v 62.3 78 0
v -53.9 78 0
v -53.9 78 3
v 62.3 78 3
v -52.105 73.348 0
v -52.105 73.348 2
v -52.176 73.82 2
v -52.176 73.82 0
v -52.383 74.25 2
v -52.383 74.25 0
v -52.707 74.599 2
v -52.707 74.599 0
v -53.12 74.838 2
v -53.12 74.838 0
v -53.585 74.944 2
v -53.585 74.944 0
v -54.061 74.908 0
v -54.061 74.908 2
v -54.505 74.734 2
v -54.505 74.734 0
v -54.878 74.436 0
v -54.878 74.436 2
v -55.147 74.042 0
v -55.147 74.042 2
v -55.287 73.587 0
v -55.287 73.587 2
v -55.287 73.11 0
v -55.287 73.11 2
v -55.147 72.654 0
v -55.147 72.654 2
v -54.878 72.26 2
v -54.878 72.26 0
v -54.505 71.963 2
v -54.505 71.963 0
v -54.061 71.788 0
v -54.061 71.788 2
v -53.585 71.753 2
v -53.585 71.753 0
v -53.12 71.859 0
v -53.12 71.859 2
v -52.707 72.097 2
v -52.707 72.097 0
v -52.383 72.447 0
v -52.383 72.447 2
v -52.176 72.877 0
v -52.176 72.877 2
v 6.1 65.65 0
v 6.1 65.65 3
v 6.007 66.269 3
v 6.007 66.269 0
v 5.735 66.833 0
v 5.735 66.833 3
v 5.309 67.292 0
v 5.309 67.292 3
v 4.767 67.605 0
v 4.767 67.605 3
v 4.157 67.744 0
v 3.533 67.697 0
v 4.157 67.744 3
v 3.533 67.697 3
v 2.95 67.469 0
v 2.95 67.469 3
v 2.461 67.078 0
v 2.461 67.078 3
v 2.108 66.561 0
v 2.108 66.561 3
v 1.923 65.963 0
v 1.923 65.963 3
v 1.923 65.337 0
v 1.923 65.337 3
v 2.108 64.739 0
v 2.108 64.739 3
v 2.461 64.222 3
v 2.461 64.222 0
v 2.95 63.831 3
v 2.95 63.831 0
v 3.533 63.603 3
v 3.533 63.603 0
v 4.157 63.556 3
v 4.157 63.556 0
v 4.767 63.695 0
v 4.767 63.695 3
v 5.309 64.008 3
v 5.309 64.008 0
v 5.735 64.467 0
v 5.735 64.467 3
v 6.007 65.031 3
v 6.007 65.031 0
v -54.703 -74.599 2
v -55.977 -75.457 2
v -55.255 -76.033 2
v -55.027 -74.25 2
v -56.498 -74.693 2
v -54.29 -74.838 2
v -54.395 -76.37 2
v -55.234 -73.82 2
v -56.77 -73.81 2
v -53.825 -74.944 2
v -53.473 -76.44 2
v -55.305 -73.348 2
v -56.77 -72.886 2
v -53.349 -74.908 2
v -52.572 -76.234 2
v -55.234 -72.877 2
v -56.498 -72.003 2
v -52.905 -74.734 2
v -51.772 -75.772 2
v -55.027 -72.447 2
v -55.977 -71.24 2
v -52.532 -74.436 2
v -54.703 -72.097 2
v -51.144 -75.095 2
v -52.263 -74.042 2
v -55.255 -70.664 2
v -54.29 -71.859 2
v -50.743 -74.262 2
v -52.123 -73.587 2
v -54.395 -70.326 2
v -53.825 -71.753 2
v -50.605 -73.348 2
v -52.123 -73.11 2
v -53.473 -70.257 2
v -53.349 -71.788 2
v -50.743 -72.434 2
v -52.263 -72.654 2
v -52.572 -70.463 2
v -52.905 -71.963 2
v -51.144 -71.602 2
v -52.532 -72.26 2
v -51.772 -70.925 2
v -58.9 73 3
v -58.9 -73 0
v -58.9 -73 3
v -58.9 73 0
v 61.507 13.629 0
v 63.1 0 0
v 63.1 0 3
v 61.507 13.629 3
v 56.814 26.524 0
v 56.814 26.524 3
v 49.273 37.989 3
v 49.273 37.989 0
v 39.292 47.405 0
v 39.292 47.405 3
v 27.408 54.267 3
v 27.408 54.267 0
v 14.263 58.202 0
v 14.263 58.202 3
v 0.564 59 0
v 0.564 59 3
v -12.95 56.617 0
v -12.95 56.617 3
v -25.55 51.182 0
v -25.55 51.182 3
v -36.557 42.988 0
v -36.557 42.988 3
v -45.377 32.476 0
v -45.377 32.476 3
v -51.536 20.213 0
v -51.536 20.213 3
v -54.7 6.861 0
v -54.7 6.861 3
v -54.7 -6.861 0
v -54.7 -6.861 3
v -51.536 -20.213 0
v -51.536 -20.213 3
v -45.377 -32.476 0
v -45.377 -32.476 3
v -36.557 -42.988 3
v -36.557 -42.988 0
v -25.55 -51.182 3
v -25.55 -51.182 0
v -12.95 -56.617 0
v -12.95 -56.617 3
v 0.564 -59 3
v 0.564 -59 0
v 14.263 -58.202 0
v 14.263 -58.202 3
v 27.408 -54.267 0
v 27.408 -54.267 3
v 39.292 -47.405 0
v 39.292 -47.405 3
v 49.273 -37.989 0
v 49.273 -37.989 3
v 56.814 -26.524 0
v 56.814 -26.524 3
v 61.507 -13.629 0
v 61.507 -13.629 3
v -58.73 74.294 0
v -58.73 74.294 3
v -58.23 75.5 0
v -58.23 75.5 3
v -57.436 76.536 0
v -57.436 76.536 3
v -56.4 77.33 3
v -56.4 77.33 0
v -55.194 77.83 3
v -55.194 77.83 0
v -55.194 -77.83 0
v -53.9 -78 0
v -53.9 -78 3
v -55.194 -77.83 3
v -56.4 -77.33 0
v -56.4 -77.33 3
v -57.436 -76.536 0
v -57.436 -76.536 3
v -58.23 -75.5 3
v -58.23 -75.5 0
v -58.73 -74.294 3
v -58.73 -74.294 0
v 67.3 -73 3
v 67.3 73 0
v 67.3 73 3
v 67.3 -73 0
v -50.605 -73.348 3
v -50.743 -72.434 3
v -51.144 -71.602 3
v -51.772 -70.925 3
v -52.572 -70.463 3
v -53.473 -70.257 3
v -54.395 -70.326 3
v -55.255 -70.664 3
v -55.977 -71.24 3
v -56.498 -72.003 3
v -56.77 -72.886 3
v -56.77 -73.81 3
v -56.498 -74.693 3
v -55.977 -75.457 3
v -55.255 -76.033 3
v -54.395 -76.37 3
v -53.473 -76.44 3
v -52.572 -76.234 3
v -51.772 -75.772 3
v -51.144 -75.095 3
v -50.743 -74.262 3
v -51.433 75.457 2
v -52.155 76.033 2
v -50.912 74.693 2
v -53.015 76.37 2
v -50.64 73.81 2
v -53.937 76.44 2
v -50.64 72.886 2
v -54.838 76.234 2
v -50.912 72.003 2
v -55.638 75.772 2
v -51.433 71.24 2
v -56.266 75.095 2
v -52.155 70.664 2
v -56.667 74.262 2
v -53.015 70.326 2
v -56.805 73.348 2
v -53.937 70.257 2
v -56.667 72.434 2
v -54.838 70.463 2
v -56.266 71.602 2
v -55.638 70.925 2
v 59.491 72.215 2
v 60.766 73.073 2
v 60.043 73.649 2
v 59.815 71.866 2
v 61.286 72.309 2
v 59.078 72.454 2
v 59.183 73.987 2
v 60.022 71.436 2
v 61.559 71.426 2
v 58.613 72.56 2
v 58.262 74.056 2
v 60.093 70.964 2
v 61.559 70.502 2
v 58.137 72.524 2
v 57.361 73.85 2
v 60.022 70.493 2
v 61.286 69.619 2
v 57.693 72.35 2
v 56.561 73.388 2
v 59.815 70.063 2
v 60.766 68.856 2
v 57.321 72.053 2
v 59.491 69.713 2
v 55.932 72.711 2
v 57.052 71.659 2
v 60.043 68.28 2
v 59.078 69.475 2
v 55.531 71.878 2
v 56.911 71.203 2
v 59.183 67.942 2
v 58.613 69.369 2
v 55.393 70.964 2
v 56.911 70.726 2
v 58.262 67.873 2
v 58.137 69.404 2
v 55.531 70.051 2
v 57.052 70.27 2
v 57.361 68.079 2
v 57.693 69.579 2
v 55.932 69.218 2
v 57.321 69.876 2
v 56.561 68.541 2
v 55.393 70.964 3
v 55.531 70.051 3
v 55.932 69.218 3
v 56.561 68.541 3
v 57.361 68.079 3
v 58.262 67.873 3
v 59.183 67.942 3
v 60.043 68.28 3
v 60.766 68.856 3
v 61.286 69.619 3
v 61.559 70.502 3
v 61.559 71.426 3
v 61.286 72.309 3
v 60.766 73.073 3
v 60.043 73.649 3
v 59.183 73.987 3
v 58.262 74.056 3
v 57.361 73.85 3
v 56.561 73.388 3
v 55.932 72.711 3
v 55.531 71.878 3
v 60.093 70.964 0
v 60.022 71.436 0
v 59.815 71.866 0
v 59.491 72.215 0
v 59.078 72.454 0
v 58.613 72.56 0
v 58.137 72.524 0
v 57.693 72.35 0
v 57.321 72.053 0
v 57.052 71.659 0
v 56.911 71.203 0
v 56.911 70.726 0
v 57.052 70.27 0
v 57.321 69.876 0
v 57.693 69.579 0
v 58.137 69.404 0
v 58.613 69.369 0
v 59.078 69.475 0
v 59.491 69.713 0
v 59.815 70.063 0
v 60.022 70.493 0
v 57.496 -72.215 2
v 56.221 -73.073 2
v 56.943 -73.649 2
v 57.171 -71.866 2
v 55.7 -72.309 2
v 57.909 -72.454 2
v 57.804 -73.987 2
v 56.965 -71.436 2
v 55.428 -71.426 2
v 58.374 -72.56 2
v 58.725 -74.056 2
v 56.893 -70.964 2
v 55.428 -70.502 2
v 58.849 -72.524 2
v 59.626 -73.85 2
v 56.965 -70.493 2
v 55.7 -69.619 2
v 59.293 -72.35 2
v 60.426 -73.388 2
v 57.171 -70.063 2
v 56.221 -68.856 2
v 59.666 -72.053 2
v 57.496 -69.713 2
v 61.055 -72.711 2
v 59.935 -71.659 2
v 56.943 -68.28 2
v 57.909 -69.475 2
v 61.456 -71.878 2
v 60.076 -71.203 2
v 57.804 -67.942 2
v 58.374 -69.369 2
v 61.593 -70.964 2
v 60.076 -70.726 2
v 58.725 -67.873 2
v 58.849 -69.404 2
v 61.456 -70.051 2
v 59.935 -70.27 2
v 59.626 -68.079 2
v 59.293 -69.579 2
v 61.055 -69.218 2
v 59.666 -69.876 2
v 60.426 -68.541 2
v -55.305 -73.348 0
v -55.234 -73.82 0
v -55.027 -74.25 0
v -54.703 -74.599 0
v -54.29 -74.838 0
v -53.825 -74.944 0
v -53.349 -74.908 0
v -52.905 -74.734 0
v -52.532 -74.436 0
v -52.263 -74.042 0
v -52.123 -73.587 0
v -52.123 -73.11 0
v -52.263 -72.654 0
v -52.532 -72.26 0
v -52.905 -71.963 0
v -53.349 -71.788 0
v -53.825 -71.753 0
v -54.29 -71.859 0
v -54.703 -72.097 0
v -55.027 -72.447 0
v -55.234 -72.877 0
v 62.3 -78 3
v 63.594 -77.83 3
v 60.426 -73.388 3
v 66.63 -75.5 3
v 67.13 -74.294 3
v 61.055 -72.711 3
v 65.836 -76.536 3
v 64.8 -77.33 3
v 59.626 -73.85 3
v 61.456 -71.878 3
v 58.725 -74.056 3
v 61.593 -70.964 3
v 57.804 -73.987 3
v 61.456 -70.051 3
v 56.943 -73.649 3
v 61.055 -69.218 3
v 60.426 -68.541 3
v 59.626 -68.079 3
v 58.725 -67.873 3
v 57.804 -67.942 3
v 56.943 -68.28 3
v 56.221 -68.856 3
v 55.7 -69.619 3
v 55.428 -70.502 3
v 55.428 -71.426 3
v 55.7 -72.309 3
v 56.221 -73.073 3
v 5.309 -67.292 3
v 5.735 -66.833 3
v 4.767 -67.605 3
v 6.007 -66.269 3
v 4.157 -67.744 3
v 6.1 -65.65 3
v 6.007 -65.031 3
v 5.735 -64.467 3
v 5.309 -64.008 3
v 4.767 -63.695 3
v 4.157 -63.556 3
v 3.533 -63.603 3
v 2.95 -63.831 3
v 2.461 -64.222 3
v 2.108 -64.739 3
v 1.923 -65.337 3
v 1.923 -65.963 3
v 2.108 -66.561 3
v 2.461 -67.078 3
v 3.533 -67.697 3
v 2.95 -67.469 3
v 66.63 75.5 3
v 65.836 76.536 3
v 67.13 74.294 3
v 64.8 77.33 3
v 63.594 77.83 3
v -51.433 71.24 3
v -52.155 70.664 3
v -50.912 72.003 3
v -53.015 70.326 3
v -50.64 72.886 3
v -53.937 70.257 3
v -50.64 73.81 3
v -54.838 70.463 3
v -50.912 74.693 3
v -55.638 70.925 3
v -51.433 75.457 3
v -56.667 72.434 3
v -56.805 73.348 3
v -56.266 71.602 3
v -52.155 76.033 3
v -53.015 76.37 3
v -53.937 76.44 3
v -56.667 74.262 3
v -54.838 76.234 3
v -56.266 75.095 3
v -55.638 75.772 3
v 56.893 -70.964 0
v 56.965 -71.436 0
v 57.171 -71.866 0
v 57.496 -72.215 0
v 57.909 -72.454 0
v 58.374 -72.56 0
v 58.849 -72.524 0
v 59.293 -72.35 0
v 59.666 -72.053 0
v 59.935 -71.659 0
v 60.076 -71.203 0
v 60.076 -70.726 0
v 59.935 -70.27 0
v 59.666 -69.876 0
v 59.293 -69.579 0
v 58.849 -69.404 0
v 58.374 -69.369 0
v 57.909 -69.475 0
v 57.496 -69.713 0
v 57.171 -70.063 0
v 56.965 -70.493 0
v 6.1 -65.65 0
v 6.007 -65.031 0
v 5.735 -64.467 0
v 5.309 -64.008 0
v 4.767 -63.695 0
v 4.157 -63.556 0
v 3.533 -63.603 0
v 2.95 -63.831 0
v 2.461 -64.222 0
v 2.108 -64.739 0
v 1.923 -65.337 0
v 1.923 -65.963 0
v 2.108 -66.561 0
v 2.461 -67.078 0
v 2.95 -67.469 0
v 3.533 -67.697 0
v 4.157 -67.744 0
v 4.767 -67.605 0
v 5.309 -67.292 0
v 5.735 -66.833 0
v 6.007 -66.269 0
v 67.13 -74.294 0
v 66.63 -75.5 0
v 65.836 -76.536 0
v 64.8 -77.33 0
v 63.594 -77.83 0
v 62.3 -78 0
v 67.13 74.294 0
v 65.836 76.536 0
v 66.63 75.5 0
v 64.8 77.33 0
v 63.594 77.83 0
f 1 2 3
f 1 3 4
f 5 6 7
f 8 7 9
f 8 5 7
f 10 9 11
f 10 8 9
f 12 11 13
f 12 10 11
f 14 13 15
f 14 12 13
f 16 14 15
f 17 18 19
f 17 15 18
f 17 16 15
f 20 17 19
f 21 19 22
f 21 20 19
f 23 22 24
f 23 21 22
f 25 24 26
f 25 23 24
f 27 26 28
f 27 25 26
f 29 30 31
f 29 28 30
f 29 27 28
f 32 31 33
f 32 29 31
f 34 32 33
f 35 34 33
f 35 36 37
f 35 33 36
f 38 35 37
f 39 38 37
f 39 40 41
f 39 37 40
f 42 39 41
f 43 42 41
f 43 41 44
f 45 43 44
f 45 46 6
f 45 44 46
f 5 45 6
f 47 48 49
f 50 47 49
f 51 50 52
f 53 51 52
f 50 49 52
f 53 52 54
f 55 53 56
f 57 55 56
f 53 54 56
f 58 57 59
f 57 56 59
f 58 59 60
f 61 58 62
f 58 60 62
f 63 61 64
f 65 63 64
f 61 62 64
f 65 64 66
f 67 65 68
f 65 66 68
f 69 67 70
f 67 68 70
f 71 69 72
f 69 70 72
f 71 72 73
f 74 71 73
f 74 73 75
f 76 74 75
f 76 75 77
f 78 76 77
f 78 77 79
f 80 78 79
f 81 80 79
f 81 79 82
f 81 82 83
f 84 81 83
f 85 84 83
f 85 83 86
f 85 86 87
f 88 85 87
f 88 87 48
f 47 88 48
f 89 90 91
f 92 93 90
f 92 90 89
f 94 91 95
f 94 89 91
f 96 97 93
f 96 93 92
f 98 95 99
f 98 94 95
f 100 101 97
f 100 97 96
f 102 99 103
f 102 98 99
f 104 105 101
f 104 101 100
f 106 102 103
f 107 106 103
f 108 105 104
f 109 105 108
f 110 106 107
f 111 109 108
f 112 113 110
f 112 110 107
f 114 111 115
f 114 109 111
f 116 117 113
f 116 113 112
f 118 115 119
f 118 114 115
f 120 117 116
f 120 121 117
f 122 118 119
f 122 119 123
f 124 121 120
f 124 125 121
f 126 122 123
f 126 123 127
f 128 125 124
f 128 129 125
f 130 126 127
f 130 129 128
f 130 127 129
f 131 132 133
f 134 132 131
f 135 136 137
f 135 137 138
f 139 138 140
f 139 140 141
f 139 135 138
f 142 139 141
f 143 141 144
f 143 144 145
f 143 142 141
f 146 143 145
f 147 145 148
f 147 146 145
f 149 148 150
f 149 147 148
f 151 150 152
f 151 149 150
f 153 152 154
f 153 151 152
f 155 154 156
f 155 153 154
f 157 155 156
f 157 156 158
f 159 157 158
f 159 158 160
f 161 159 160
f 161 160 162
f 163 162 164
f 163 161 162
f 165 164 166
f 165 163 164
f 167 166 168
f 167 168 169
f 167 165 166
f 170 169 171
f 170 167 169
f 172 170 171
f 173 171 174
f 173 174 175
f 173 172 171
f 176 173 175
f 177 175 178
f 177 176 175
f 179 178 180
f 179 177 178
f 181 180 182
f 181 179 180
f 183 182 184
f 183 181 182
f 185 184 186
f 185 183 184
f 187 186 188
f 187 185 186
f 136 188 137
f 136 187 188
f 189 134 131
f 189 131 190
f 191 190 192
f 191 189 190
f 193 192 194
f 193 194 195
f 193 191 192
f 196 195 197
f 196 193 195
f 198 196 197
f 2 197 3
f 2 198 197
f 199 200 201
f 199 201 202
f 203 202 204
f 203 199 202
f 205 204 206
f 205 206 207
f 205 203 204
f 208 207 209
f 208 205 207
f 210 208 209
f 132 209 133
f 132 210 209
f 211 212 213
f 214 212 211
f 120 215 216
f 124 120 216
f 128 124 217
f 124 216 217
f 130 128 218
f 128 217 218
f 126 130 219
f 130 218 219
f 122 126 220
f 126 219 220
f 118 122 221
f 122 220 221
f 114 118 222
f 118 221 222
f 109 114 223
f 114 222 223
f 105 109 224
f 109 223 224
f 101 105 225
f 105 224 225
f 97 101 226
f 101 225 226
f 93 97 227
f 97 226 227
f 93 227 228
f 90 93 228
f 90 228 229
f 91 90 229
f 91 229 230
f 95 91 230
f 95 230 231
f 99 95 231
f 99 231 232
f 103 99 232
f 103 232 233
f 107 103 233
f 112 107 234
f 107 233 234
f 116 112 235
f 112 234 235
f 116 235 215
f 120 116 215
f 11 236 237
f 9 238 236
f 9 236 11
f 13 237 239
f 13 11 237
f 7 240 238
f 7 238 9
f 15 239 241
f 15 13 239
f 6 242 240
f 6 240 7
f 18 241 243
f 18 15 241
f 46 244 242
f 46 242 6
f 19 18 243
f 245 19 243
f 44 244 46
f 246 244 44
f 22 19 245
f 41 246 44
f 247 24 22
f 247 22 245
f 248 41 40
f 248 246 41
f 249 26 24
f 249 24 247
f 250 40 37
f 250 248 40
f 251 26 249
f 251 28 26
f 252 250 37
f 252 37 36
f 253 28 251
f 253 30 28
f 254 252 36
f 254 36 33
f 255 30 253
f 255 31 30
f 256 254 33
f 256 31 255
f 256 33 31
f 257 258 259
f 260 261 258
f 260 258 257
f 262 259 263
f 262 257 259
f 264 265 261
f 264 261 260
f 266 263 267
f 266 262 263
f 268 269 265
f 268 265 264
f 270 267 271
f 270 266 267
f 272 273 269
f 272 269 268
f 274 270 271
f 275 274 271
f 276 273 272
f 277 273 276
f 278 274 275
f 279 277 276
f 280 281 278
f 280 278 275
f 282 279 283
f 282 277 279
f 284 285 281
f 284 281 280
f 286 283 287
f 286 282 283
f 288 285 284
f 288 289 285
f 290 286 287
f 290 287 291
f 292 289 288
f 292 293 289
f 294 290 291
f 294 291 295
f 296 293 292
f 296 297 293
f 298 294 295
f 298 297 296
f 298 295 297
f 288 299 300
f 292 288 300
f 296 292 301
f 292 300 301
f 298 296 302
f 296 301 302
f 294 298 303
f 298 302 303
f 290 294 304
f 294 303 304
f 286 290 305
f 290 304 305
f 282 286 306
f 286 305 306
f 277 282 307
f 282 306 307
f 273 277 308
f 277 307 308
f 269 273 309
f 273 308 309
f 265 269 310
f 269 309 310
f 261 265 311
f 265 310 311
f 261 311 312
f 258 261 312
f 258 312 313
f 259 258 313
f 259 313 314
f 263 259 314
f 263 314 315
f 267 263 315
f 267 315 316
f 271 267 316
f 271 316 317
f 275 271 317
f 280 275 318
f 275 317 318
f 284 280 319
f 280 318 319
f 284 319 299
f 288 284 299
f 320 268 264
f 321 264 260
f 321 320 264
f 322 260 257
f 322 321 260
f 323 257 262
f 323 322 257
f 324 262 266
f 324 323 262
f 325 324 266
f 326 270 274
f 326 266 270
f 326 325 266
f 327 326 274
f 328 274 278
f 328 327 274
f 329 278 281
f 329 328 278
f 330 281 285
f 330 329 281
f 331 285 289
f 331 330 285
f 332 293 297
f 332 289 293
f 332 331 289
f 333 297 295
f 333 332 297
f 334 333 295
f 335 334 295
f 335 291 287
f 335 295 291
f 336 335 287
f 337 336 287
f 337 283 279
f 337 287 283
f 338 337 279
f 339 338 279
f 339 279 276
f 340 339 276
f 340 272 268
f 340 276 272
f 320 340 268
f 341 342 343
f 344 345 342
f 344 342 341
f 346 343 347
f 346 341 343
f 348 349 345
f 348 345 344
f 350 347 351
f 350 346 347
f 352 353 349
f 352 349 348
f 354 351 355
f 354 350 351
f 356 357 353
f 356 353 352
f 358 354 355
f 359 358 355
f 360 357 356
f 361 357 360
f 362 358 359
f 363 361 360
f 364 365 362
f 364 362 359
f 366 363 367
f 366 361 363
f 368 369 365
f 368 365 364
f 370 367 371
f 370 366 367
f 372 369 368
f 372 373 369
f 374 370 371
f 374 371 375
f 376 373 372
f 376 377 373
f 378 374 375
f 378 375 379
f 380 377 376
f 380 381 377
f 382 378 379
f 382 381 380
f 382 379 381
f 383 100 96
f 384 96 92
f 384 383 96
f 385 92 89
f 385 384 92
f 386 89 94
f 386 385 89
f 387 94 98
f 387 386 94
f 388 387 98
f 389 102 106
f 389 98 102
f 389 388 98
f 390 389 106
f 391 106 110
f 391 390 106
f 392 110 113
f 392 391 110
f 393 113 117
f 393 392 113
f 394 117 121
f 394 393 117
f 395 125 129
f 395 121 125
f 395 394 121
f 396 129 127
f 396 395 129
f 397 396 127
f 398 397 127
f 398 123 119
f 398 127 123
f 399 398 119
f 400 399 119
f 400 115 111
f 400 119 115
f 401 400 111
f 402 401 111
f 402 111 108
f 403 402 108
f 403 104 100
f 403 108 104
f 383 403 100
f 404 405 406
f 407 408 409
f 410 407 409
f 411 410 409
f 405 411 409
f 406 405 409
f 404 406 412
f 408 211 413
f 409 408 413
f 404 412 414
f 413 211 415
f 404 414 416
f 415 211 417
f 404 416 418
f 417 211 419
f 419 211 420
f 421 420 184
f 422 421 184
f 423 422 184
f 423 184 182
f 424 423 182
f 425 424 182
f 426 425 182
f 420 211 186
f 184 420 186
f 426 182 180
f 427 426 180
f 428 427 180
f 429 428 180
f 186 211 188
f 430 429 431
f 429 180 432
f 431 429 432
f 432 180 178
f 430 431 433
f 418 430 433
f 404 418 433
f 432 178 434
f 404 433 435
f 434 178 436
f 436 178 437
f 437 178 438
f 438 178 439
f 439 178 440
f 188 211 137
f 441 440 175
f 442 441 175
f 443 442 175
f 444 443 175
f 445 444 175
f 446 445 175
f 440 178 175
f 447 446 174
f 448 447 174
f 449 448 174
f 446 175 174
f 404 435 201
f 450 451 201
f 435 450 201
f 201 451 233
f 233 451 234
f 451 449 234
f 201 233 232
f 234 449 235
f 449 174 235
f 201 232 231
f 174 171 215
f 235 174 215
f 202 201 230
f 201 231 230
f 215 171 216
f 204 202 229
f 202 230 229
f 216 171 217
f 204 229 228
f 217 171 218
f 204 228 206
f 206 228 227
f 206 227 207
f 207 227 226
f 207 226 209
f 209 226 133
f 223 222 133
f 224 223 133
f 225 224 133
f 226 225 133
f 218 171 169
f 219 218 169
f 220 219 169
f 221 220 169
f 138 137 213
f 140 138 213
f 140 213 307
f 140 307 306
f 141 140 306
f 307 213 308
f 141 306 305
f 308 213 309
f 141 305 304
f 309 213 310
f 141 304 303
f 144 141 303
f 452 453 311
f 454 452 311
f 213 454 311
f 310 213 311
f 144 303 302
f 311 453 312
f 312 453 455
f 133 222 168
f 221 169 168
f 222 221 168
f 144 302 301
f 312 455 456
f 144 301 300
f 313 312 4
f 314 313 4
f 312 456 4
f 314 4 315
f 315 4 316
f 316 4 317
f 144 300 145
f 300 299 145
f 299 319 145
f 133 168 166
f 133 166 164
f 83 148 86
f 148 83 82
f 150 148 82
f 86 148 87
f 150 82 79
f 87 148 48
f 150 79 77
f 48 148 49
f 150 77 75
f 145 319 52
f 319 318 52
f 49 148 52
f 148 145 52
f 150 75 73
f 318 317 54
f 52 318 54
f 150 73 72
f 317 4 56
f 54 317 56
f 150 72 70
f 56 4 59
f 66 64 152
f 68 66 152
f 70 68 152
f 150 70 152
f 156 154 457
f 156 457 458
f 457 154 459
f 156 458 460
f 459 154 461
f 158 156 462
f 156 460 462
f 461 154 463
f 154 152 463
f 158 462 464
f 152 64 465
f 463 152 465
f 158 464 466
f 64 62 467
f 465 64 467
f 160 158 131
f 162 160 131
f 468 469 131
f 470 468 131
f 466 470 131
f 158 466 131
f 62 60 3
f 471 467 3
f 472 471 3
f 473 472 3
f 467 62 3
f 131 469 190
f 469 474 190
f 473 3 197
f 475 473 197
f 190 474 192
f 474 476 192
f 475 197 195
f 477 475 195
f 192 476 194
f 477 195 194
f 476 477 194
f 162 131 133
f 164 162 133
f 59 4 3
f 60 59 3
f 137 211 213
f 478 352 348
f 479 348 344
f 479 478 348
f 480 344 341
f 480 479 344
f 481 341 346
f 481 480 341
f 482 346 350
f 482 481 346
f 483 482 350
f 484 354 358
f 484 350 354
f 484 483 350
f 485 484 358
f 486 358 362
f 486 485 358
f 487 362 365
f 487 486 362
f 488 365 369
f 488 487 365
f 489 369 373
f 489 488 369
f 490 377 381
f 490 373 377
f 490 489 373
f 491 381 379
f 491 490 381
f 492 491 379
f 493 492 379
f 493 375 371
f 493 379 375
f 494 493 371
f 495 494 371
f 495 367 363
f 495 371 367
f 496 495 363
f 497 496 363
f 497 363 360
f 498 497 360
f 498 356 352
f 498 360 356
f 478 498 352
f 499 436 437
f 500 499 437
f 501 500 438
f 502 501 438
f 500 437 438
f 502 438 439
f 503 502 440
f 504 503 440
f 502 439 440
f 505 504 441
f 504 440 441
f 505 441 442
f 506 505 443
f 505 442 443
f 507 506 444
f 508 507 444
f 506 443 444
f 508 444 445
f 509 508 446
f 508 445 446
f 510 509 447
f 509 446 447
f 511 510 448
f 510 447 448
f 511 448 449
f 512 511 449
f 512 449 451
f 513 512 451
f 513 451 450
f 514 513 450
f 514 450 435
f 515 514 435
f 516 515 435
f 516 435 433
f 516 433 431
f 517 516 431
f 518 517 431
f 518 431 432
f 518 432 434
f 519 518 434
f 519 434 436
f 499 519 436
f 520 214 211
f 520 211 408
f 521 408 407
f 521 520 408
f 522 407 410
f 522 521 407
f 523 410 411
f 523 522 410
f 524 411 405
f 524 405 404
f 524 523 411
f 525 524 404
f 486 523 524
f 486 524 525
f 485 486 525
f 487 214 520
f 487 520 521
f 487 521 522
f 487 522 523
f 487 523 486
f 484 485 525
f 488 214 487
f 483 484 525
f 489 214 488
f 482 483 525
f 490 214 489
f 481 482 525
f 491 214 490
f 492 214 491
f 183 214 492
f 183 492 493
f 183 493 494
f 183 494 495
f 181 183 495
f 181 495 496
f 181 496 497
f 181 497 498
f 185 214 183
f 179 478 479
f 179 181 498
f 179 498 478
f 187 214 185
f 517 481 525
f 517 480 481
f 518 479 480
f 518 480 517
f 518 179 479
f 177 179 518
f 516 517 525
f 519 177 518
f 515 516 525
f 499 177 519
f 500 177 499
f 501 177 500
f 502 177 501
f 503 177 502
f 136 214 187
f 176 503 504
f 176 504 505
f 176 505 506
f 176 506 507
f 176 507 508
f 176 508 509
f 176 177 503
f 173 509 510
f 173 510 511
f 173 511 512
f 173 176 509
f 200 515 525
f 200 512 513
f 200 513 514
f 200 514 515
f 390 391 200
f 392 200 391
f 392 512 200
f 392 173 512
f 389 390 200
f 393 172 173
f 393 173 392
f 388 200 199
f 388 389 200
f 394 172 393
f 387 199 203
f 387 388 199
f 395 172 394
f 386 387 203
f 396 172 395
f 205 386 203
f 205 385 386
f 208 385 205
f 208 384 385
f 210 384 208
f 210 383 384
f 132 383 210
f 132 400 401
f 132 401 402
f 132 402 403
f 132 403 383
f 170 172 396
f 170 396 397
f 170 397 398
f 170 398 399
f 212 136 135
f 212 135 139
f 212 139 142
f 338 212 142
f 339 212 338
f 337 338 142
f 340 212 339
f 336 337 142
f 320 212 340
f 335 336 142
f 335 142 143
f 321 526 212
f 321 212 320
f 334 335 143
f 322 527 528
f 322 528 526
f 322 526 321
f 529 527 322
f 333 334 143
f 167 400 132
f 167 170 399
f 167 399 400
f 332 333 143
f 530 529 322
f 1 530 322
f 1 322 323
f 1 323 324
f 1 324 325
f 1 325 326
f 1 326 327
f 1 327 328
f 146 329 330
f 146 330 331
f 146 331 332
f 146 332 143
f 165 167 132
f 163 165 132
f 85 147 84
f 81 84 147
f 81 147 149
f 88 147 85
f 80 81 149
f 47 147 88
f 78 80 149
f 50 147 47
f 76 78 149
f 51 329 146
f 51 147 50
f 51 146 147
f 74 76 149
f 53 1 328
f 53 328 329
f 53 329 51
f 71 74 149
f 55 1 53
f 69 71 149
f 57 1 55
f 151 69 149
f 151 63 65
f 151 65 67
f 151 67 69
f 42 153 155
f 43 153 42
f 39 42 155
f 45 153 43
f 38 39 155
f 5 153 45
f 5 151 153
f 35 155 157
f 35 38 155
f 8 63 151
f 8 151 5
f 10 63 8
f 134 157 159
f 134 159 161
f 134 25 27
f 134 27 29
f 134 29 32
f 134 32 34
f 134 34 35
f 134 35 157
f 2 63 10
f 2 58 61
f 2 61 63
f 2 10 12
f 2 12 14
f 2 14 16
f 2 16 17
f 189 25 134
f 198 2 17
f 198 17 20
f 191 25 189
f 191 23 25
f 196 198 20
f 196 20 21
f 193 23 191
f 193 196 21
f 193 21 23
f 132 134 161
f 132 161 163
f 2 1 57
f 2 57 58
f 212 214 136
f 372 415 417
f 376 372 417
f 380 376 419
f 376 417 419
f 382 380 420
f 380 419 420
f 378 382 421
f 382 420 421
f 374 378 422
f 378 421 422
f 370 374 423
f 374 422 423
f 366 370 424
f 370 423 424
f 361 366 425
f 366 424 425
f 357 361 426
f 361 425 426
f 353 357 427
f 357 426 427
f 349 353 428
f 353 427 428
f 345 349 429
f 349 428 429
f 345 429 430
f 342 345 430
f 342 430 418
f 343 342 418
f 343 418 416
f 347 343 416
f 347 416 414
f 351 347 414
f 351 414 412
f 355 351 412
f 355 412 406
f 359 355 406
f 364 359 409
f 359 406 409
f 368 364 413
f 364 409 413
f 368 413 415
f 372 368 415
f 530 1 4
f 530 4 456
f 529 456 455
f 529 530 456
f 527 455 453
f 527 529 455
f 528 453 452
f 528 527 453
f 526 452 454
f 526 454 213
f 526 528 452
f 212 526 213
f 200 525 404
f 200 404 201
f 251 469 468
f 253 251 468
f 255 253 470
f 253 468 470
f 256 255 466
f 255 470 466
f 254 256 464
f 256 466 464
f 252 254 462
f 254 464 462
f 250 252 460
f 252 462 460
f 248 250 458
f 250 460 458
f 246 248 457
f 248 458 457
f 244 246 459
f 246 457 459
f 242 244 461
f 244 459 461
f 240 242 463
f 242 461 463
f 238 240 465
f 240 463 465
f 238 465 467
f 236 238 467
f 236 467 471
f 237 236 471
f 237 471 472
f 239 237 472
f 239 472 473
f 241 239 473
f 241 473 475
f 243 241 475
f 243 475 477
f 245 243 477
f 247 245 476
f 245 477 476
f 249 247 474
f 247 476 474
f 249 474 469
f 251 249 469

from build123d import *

# Parameters (mm, degrees)
SKETCH_1_R          = 59.1
SKETCH_1_R_2        = 1.6
EXTRUDE_1_DEPTH     = 3
SKETCH_2_R          = 2.1
CUT_EXTRUDE_1_DEPTH = 104.064494371
SKETCH_3_R          = 3.1
CUT_EXTRUDE_2_DEPTH = 1


with BuildPart() as part:
    # 草图1 → 凸台-拉伸1 (new body)
    with BuildSketch(Plane.XY):
        with BuildLine():
            Line((62.3, -78), (-53.9, -78))
            ThreePointArc((-53.9, -78), (-57.435533906, -76.535533906), (-58.9, -73))
            Line((-58.9, -73), (-58.9, 73))
            ThreePointArc((-58.9, 73), (-57.435533906, 76.535533906), (-53.9, 78))
            Line((-53.9, 78), (62.3, 78))
            ThreePointArc((62.3, 78), (65.835533906, 76.535533906), (67.3, 73))
            Line((67.3, 73), (67.3, -73))
            ThreePointArc((67.3, -73), (65.835533906, -76.535533906), (62.3, -78))
        make_face()
        with Locations((4, 0)):
            Circle(SKETCH_1_R, mode=Mode.SUBTRACT)
        with Locations((58.493442579, 70.964337058)):
            Circle(SKETCH_1_R_2, mode=Mode.SUBTRACT)
        with Locations((-53.705008218, 73.348219362)):
            Circle(SKETCH_1_R_2, mode=Mode.SUBTRACT)
        with Locations(Location((58.493442579, -70.964337058, 0), (0, 0, 180))):
            Circle(SKETCH_1_R_2, mode=Mode.SUBTRACT)
        with Locations(Location((-53.705008218, -73.348219362, 0), (0, 0, 180))):
            Circle(SKETCH_1_R_2, mode=Mode.SUBTRACT)
    extrude(amount=EXTRUDE_1_DEPTH)

    # 草图2 → 切除-拉伸1 (cut, through all)
    with BuildSketch(Plane.XY.offset(3)):
        with Locations((4, -65.65)):
            Circle(SKETCH_2_R)
        with Locations((4, 65.65)):
            Circle(SKETCH_2_R)
    extrude(amount=-CUT_EXTRUDE_1_DEPTH, mode=Mode.SUBTRACT)

    # 草图3 → 切除-拉伸2 (cut)
    with BuildSketch(Plane.XY.offset(3)):
        with Locations((58.493442579, -70.964337058)):
            Circle(SKETCH_3_R)
        with Locations((-53.705008218, -73.348219362)):
            Circle(SKETCH_3_R)
        with Locations(Location((-53.705008218, 73.348219362, 0), (0, 0, 180))):
            Circle(SKETCH_3_R)
        with Locations(Location((58.493442579, 70.964337058, 0), (0, 0, 180))):
            Circle(SKETCH_3_R)
    extrude(amount=-CUT_EXTRUDE_2_DEPTH, mode=Mode.SUBTRACT)


solid = part.part
